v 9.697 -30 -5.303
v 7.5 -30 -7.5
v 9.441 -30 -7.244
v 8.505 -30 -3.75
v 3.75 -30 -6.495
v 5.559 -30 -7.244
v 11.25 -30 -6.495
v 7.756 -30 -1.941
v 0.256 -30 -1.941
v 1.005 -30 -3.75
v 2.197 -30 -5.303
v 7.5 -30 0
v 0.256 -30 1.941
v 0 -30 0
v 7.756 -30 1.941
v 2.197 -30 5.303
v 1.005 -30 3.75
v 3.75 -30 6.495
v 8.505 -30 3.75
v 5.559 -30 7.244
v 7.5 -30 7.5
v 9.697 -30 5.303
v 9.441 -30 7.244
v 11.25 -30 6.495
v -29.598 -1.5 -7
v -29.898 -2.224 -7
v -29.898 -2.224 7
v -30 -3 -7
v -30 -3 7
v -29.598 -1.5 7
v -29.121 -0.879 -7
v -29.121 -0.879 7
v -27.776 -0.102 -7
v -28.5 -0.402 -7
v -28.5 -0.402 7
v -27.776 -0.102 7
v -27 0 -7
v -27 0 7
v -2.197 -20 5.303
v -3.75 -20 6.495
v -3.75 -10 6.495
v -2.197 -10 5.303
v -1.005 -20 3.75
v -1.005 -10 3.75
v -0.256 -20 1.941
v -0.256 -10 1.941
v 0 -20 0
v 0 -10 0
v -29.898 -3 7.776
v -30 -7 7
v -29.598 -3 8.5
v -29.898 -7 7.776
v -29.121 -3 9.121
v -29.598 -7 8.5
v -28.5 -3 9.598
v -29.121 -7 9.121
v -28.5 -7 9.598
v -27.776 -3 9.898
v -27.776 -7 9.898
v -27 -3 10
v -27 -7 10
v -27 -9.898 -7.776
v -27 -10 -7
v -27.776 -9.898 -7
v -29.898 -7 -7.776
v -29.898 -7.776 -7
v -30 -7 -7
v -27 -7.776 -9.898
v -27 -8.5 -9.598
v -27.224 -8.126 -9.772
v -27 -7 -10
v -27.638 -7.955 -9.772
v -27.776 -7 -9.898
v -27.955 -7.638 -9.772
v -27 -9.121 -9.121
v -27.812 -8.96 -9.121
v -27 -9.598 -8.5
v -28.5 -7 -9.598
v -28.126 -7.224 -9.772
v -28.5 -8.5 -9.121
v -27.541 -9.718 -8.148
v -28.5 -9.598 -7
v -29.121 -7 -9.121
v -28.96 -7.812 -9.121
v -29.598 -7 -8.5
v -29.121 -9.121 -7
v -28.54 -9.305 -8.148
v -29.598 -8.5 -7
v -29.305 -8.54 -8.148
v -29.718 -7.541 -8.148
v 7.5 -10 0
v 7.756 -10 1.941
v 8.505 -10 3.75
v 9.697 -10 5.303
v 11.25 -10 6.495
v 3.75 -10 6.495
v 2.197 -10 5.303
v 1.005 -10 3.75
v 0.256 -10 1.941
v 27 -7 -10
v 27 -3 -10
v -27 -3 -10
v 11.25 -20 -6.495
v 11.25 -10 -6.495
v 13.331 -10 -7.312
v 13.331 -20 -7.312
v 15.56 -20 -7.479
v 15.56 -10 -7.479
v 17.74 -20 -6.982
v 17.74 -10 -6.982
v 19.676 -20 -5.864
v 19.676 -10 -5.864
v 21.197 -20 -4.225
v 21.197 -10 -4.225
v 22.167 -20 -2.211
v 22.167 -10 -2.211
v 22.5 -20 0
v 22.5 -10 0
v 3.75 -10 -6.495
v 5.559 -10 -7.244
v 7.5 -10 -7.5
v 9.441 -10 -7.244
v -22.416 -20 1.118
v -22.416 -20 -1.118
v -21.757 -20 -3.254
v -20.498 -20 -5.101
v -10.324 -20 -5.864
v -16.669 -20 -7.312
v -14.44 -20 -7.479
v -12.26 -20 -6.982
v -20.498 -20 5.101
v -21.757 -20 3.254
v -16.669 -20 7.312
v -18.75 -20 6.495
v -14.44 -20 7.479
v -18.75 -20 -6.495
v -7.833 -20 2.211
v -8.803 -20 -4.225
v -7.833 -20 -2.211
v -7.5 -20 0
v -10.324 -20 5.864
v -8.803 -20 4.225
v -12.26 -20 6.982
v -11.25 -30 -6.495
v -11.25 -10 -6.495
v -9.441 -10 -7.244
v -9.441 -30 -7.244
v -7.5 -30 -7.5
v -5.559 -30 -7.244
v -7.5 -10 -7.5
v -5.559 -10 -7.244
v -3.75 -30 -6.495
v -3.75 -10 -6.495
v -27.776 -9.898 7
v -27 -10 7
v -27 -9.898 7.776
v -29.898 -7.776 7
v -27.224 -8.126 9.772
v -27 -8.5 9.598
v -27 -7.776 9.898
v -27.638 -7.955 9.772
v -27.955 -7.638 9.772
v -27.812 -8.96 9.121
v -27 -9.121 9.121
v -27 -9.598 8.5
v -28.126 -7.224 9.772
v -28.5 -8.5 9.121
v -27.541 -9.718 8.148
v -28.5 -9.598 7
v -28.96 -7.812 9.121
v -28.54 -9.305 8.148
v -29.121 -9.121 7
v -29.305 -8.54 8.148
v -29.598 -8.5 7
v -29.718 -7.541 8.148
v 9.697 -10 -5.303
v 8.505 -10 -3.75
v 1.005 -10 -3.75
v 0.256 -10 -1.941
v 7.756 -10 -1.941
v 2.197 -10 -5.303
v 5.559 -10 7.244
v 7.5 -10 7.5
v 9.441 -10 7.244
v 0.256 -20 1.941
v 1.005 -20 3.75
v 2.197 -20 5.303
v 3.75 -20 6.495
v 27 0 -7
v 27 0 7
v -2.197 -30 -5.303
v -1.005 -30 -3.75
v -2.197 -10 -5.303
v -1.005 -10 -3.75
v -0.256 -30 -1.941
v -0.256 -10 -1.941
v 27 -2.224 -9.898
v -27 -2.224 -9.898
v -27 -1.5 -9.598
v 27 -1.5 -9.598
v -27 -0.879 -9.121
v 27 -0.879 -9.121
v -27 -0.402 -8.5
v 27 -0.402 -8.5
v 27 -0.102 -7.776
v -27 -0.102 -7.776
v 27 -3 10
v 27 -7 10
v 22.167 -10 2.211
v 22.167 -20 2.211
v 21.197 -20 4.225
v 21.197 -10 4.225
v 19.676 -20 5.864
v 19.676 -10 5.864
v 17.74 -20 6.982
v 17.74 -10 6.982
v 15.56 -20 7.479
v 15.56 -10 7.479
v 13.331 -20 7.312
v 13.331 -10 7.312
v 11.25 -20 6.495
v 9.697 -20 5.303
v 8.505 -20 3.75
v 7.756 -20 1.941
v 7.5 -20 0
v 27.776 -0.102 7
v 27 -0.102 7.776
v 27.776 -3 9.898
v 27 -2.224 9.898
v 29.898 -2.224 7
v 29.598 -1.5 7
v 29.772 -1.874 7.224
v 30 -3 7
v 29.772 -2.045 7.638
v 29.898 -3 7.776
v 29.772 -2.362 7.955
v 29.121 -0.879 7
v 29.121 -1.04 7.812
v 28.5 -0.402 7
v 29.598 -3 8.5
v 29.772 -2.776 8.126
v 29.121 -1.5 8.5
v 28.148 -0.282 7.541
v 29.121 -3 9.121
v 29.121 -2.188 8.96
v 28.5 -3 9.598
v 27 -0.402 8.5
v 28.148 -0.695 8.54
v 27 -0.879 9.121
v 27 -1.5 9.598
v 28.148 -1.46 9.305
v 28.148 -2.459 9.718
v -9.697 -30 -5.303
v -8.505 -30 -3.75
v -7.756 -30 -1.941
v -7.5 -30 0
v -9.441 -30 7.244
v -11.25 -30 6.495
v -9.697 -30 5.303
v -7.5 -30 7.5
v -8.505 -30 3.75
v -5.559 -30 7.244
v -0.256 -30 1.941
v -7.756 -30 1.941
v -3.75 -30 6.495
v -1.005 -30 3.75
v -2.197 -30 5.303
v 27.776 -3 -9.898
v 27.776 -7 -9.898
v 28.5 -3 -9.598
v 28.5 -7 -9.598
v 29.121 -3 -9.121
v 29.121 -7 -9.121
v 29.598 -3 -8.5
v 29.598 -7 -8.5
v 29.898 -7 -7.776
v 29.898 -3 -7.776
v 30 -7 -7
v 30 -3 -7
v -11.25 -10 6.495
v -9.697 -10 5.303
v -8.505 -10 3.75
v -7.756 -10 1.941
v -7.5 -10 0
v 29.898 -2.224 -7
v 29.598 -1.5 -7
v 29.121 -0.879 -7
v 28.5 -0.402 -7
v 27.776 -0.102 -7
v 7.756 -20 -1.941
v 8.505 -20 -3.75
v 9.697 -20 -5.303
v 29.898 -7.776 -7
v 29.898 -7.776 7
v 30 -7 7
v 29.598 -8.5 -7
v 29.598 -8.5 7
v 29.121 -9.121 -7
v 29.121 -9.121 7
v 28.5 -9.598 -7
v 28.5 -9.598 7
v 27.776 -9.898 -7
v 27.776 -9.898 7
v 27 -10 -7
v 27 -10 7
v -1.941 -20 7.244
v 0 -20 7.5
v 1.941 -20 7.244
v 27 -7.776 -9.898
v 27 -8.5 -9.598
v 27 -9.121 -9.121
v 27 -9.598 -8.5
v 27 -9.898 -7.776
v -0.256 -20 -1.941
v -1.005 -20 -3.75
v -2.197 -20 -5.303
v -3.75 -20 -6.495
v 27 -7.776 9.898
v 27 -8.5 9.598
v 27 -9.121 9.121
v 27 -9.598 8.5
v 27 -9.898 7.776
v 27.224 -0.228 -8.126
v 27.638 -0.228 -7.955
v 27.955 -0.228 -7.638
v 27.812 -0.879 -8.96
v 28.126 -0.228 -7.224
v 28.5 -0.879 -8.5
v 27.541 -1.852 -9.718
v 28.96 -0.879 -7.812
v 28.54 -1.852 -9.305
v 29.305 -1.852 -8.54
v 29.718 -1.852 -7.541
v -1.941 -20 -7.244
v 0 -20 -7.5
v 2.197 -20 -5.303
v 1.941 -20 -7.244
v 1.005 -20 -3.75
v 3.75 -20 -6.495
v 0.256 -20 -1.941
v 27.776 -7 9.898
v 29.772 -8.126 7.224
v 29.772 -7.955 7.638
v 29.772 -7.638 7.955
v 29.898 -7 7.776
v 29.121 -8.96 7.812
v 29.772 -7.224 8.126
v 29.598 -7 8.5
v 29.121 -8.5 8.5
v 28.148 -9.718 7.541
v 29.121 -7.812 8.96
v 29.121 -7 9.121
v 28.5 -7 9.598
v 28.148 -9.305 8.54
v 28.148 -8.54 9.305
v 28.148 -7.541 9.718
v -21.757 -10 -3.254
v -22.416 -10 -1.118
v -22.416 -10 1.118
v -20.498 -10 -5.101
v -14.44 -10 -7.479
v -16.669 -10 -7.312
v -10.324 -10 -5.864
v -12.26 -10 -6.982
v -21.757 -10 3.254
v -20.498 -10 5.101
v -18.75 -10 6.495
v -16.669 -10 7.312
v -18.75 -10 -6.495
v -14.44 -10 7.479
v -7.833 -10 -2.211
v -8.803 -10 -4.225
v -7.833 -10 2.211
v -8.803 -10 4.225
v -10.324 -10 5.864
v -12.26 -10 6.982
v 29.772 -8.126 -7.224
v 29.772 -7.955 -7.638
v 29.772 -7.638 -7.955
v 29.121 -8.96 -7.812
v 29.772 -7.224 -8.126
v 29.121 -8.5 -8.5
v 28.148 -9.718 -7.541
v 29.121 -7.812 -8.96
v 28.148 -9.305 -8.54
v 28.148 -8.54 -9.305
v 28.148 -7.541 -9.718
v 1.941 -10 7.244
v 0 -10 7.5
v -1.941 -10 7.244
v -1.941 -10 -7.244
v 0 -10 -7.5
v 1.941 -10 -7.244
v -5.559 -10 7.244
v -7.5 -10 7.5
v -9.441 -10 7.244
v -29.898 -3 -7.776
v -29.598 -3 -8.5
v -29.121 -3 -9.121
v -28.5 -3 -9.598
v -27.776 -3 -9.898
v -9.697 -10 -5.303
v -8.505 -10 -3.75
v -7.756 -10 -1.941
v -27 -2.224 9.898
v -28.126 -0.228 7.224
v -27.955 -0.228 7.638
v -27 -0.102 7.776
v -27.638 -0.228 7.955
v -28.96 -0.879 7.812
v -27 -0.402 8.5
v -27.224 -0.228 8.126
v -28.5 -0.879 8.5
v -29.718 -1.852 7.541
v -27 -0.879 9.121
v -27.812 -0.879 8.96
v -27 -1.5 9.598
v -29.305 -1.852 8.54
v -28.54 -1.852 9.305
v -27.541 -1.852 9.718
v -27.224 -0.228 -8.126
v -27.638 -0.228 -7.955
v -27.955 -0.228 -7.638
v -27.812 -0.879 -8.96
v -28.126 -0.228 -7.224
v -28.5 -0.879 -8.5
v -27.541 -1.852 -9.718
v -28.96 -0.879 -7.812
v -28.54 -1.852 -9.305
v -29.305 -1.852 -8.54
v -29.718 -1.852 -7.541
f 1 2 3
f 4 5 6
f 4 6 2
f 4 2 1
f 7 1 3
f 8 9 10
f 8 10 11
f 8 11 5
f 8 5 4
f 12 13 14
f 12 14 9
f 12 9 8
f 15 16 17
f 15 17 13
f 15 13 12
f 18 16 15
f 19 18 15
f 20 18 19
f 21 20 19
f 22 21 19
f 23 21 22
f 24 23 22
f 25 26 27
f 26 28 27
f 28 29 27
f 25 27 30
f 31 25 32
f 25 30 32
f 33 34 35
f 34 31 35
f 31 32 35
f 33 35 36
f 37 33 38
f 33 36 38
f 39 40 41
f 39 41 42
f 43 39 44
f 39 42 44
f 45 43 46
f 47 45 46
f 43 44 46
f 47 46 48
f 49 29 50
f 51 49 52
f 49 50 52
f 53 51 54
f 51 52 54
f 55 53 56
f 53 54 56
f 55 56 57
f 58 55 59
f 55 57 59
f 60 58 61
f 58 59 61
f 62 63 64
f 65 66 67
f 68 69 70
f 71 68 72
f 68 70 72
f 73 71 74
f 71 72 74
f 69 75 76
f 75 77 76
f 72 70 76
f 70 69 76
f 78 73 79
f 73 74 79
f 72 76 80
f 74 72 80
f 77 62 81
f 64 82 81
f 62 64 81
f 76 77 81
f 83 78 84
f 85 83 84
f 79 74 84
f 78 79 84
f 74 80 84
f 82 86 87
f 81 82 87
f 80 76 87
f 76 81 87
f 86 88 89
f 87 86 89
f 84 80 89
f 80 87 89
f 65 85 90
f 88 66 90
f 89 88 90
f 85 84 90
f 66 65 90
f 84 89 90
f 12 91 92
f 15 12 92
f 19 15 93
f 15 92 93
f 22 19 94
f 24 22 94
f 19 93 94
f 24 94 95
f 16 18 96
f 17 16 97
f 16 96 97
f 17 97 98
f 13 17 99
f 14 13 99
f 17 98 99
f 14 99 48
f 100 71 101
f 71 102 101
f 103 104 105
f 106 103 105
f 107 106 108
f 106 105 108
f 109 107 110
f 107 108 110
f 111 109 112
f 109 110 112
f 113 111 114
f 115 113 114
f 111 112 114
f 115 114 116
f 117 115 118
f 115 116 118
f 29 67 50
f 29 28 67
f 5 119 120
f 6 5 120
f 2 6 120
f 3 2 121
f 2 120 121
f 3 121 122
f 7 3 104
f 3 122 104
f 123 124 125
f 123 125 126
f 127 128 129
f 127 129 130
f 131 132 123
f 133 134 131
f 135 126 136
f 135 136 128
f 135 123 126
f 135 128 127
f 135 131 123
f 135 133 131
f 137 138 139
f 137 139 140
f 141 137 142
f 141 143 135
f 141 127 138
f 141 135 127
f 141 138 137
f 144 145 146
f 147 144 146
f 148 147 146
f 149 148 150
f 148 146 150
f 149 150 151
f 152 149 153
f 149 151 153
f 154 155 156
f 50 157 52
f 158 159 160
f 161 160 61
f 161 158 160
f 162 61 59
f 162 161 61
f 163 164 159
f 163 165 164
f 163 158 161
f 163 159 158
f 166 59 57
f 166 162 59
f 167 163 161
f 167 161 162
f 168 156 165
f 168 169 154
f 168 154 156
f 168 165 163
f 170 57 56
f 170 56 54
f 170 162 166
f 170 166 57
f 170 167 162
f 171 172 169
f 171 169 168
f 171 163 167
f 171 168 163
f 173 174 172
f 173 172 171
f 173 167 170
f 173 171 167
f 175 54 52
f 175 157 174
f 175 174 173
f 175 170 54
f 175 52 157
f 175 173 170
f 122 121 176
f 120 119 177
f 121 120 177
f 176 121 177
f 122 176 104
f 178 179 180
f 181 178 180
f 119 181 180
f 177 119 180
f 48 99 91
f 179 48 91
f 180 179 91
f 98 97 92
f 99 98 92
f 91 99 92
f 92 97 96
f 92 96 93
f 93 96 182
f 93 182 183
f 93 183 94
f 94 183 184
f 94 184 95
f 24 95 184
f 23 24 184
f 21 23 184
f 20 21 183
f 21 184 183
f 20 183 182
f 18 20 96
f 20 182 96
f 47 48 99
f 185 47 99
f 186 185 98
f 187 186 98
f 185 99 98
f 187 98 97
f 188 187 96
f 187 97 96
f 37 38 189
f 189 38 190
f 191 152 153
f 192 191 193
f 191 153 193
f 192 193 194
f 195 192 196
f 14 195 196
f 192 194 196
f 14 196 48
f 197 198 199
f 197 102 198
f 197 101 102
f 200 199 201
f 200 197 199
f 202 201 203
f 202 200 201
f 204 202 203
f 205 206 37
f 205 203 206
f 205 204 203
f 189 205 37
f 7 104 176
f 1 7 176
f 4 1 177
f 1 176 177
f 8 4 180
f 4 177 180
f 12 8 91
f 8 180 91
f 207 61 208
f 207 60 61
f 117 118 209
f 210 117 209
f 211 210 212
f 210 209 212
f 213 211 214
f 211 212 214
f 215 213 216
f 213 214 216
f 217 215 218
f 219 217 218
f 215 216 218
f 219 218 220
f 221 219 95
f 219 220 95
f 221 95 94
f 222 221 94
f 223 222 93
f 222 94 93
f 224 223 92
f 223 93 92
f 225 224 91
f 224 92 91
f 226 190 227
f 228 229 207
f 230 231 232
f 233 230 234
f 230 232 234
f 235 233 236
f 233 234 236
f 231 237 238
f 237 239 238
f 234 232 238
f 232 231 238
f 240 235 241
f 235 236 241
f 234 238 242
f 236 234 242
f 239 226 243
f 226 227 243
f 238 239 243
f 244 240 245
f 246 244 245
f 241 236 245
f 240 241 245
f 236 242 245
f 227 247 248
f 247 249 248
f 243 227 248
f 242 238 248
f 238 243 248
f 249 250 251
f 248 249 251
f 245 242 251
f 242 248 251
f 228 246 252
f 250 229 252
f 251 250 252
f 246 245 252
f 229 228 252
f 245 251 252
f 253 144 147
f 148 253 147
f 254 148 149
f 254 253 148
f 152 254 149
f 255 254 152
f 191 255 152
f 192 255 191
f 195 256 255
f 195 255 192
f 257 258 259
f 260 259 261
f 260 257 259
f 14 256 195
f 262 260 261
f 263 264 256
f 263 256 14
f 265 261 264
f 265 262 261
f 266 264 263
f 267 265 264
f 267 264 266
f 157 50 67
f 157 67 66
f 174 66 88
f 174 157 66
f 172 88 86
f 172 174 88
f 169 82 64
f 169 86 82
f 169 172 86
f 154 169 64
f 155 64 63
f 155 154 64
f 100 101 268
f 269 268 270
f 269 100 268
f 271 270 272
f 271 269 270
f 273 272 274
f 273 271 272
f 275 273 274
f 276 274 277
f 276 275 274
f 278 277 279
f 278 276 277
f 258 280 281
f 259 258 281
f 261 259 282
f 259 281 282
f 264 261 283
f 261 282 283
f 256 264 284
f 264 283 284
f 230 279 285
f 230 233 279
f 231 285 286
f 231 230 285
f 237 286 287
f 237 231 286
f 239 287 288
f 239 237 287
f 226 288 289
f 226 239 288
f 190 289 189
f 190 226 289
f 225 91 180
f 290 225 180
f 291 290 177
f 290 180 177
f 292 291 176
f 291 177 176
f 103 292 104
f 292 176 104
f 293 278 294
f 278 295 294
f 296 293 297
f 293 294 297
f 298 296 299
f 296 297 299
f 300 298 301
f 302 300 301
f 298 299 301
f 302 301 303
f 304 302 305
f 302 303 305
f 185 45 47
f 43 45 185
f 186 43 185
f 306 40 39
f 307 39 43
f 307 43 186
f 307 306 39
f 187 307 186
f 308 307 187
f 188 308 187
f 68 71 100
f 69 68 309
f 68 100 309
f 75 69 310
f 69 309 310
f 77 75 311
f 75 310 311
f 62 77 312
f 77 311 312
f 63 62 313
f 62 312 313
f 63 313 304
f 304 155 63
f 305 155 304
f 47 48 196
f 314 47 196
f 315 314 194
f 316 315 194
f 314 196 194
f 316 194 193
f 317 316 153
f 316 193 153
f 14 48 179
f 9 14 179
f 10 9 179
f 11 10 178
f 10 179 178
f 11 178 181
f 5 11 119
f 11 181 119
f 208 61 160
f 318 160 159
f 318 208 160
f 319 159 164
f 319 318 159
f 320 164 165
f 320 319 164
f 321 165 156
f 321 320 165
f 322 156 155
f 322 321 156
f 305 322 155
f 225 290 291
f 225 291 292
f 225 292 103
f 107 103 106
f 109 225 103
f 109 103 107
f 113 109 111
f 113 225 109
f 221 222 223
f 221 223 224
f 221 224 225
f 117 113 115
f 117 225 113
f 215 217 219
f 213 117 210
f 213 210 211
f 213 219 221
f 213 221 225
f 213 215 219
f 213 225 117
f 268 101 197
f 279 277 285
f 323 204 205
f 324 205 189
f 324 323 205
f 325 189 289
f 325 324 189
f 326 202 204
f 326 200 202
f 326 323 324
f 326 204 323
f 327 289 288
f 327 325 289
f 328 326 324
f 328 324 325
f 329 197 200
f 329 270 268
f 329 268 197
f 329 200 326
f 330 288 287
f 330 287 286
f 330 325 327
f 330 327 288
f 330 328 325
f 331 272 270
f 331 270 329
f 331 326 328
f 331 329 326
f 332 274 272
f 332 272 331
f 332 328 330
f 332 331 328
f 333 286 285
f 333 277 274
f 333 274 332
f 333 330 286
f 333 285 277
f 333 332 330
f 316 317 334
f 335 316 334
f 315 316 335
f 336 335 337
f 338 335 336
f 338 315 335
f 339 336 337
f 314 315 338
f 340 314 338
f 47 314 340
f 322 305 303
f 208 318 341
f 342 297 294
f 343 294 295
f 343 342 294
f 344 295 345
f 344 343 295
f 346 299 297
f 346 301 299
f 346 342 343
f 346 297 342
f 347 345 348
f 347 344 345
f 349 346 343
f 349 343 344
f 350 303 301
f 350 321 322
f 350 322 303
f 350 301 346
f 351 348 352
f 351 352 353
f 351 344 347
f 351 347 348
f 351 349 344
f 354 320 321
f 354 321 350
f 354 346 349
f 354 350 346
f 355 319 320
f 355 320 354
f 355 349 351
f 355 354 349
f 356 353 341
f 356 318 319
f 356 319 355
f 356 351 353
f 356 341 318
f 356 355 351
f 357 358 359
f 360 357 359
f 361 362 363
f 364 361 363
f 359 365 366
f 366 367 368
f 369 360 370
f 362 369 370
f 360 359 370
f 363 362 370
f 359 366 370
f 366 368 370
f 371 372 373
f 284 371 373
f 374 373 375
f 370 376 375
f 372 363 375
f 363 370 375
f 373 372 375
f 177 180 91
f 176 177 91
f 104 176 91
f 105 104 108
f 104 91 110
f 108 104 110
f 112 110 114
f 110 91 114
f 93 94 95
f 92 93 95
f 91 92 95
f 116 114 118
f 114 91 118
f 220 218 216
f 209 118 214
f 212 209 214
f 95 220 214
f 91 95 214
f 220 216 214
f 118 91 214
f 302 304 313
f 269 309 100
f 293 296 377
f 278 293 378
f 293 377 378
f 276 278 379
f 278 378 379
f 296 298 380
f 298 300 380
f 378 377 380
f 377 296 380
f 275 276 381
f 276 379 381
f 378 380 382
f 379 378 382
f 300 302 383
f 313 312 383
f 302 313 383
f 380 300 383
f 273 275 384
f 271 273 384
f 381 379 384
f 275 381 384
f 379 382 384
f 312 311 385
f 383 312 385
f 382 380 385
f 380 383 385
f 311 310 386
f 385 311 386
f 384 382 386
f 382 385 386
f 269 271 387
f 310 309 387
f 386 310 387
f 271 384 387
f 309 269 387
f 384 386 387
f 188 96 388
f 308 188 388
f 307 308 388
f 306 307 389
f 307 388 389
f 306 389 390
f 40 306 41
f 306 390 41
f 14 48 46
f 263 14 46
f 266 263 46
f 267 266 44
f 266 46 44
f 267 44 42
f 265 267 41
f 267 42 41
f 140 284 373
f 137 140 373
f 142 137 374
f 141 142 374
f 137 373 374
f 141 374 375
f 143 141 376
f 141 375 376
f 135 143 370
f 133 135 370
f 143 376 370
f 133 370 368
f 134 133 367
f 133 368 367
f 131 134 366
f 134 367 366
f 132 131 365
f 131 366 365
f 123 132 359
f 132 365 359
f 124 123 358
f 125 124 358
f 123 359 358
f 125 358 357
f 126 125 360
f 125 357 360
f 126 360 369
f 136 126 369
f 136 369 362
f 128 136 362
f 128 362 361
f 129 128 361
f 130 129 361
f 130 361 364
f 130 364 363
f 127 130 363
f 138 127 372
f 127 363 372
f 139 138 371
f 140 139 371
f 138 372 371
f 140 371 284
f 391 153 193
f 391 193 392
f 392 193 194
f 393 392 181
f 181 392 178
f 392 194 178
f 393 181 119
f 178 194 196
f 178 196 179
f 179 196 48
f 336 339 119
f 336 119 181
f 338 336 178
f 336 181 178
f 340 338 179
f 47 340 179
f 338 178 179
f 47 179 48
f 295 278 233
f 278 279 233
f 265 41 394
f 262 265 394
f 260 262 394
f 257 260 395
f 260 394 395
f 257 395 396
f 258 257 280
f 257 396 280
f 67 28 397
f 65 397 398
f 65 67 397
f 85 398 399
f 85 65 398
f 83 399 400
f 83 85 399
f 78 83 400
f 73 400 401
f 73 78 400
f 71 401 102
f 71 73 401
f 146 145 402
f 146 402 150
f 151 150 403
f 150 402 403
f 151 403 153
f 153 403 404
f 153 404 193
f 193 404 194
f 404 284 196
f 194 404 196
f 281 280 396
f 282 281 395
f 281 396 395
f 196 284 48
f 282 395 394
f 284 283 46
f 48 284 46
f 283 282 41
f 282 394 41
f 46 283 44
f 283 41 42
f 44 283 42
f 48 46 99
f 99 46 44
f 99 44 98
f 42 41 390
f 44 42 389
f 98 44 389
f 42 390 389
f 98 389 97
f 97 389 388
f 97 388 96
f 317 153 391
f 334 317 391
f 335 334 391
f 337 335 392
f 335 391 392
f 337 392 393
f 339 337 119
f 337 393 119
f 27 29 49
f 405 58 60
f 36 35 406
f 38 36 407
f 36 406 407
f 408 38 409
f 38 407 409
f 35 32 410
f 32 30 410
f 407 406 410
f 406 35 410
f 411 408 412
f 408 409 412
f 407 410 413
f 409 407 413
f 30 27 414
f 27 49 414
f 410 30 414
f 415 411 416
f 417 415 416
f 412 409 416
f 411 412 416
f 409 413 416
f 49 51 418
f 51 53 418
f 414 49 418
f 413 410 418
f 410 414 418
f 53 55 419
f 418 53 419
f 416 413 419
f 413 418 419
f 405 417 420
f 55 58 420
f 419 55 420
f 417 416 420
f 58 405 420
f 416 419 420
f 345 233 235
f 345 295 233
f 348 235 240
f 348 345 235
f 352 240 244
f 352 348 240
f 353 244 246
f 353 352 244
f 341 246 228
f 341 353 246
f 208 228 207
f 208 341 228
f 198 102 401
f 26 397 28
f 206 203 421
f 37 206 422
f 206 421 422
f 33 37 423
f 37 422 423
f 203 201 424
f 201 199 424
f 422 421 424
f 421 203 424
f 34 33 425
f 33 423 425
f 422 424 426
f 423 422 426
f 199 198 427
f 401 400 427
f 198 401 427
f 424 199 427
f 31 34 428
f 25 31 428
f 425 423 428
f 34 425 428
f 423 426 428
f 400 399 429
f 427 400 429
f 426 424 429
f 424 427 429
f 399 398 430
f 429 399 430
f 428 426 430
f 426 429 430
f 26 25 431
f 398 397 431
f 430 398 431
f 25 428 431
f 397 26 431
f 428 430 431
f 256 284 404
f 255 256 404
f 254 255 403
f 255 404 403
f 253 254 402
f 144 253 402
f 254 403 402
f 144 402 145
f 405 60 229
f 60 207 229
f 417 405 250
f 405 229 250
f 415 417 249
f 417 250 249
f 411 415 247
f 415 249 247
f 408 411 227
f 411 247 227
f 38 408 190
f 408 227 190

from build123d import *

# Parameters (mm, degrees)
F0_W     = 60
F0_H     = 20
F1_DEPTH = 10
F3_DEPTH = 10
F4_DEPTH = 20
F5_DEPTH = 20
F6_DEPTH = 10
F7_R     = 3


with BuildPart() as f1:
    # F0 (on Front) → F1 (new body)
    with BuildSketch(Plane.XZ):
        Rectangle(F0_W, F0_H)
    extrude(amount=F1_DEPTH)

    # F7
    f7_edges = [f1.edges().sort_by_distance(p)[0] for p in [
        (-30, -10, 0),
        (0, -10, 10),
        (0, -10, -10),
        (30, -10, 0),
        (-30, -5, -10),
        (30, -5, -10),
        (0, 0, -10),
        (-30, -5, 10),
        (-30, 0, 0),
        (0, 0, 10),
        (30, 0, 0),
        (30, -5, 10),
    ]]
    fillet(f7_edges, radius=F7_R)


with BuildPart() as f3:
    # F2 (on face) → F3 (new body)
    with BuildSketch(Plane.XZ.offset(10)):
        with BuildLine():
            ThreePointArc((-11.25, -6.4951905284), (-15, 0), (-11.25, 6.4951905284))
            ThreePointArc((-11.25, 6.4951905284), (-22.5, 0), (-11.25, -6.4951905284))
        make_face()
        with BuildLine():
            ThreePointArc((-11.25, -6.4951905284), (-8.5048094716, -3.75), (-7.5, 0))
            ThreePointArc((-7.5, 0), (-8.5048094716, 3.75), (-11.25, 6.4951905284))
            ThreePointArc((-11.25, 6.4951905284), (-15, 0), (-11.25, -6.4951905284))
        make_face()
    extrude(amount=F3_DEPTH)


with BuildPart() as f4:
    # F2 (on face) → F4 (new body)
    with BuildSketch(Plane.XZ.offset(10)):
        with BuildLine():
            ThreePointArc((0, 0), (-1.0048094716, 3.75), (-3.75, 6.4951905284))
            ThreePointArc((-3.75, 6.4951905284), (-6.4951905284, 3.75), (-7.5, 0))
            ThreePointArc((-7.5, 0), (-6.4951905284, -3.75), (-3.75, -6.4951905284))
            ThreePointArc((-3.75, -6.4951905284), (-1.0048094716, -3.75), (0, 0))
        make_face()
        with BuildLine():
            ThreePointArc((-11.25, -6.4951905284), (-7.5, -7.5), (-3.75, -6.4951905284))
            ThreePointArc((-3.75, -6.4951905284), (-6.4951905284, -3.75), (-7.5, 0))
            ThreePointArc((-7.5, 0), (-8.5048094716, -3.75), (-11.25, -6.4951905284))
        make_face()
        with BuildLine():
            ThreePointArc((-7.5, 0), (-6.4951905284, 3.75), (-3.75, 6.4951905284))
            ThreePointArc((-3.75, 6.4951905284), (-7.5, 7.5), (-11.25, 6.4951905284))
            ThreePointArc((-11.25, 6.4951905284), (-8.5048094716, 3.75), (-7.5, 0))
        make_face()
    extrude(amount=F4_DEPTH)


with BuildPart() as f5:
    # F2 (on face) → F5 (new body)
    with BuildSketch(Plane.XZ.offset(10)):
        with BuildLine():
            ThreePointArc((3.75, -6.4951905284), (6.4951905284, -3.75), (7.5, 0))
            ThreePointArc((7.5, 0), (6.4951905284, 3.75), (3.75, 6.4951905284))
            ThreePointArc((3.75, 6.4951905284), (1.0048094716, 3.75), (0, 0))
            ThreePointArc((0, 0), (1.0048094716, -3.75), (3.75, -6.4951905284))
        make_face()
        with BuildLine():
            ThreePointArc((11.25, -6.4951905284), (8.5048094716, -3.75), (7.5, 0))
            ThreePointArc((7.5, 0), (6.4951905284, -3.75), (3.75, -6.4951905284))
            ThreePointArc((3.75, -6.4951905284), (7.5, -7.5), (11.25, -6.4951905284))
        make_face()
        with BuildLine():
            ThreePointArc((3.75, 6.4951905284), (6.4951905284, 3.75), (7.5, 0))
            ThreePointArc((7.5, 0), (8.5048094716, 3.75), (11.25, 6.4951905284))
            ThreePointArc((11.25, 6.4951905284), (7.5, 7.5), (3.75, 6.4951905284))
        make_face()
    extrude(amount=F5_DEPTH)


with BuildPart() as f6:
    # F2 (on face) → F6 (new body)
    with BuildSketch(Plane.XZ.offset(10)):
        with BuildLine():
            ThreePointArc((-3.75, -6.4951905284), (0, -7.5), (3.75, -6.4951905284))
            ThreePointArc((3.75, -6.4951905284), (1.0048094716, -3.75), (0, 0))
            ThreePointArc((0, 0), (-1.0048094716, -3.75), (-3.75, -6.4951905284))
        make_face()
    extrude(amount=F6_DEPTH)


with BuildPart() as f6b:
    # F2 (on face) → F6, piece 2 (new body)
    with BuildSketch(Plane.XZ.offset(10)):
        with BuildLine():
            ThreePointArc((0, 0), (1.0048094716, 3.75), (3.75, 6.4951905284))
            ThreePointArc((3.75, 6.4951905284), (0, 7.5), (-3.75, 6.4951905284))
            ThreePointArc((-3.75, 6.4951905284), (-1.0048094716, 3.75), (0, 0))
        make_face()
    extrude(amount=F6_DEPTH)


with BuildPart() as f6c:
    # F2 (on face) → F6, piece 3 (new body)
    with BuildSketch(Plane.XZ.offset(10)):
        with BuildLine():
            ThreePointArc((11.25, 6.4951905284), (8.5048094716, 3.75), (7.5, 0))
            ThreePointArc((7.5, 0), (8.5048094716, -3.75), (11.25, -6.4951905284))
            ThreePointArc((11.25, -6.4951905284), (13.9951905284, -3.75), (15, 0))
            ThreePointArc((15, 0), (13.9951905284, 3.75), (11.25, 6.4951905284))
        make_face()
        with BuildLine():
            ThreePointArc((22.5, 0), (18.75, 6.4951905284), (11.25, 6.4951905284))
            ThreePointArc((11.25, 6.4951905284), (13.9951905284, 3.75), (15, 0))
            ThreePointArc((15, 0), (13.9951905284, -3.75), (11.25, -6.4951905284))
            ThreePointArc((11.25, -6.4951905284), (18.75, -6.4951905284), (22.5, 0))
        make_face()
    extrude(amount=F6_DEPTH)


solid = Compound([f1.part, f3.part, f4.part, f5.part, f6.part, f6b.part, f6c.part])
